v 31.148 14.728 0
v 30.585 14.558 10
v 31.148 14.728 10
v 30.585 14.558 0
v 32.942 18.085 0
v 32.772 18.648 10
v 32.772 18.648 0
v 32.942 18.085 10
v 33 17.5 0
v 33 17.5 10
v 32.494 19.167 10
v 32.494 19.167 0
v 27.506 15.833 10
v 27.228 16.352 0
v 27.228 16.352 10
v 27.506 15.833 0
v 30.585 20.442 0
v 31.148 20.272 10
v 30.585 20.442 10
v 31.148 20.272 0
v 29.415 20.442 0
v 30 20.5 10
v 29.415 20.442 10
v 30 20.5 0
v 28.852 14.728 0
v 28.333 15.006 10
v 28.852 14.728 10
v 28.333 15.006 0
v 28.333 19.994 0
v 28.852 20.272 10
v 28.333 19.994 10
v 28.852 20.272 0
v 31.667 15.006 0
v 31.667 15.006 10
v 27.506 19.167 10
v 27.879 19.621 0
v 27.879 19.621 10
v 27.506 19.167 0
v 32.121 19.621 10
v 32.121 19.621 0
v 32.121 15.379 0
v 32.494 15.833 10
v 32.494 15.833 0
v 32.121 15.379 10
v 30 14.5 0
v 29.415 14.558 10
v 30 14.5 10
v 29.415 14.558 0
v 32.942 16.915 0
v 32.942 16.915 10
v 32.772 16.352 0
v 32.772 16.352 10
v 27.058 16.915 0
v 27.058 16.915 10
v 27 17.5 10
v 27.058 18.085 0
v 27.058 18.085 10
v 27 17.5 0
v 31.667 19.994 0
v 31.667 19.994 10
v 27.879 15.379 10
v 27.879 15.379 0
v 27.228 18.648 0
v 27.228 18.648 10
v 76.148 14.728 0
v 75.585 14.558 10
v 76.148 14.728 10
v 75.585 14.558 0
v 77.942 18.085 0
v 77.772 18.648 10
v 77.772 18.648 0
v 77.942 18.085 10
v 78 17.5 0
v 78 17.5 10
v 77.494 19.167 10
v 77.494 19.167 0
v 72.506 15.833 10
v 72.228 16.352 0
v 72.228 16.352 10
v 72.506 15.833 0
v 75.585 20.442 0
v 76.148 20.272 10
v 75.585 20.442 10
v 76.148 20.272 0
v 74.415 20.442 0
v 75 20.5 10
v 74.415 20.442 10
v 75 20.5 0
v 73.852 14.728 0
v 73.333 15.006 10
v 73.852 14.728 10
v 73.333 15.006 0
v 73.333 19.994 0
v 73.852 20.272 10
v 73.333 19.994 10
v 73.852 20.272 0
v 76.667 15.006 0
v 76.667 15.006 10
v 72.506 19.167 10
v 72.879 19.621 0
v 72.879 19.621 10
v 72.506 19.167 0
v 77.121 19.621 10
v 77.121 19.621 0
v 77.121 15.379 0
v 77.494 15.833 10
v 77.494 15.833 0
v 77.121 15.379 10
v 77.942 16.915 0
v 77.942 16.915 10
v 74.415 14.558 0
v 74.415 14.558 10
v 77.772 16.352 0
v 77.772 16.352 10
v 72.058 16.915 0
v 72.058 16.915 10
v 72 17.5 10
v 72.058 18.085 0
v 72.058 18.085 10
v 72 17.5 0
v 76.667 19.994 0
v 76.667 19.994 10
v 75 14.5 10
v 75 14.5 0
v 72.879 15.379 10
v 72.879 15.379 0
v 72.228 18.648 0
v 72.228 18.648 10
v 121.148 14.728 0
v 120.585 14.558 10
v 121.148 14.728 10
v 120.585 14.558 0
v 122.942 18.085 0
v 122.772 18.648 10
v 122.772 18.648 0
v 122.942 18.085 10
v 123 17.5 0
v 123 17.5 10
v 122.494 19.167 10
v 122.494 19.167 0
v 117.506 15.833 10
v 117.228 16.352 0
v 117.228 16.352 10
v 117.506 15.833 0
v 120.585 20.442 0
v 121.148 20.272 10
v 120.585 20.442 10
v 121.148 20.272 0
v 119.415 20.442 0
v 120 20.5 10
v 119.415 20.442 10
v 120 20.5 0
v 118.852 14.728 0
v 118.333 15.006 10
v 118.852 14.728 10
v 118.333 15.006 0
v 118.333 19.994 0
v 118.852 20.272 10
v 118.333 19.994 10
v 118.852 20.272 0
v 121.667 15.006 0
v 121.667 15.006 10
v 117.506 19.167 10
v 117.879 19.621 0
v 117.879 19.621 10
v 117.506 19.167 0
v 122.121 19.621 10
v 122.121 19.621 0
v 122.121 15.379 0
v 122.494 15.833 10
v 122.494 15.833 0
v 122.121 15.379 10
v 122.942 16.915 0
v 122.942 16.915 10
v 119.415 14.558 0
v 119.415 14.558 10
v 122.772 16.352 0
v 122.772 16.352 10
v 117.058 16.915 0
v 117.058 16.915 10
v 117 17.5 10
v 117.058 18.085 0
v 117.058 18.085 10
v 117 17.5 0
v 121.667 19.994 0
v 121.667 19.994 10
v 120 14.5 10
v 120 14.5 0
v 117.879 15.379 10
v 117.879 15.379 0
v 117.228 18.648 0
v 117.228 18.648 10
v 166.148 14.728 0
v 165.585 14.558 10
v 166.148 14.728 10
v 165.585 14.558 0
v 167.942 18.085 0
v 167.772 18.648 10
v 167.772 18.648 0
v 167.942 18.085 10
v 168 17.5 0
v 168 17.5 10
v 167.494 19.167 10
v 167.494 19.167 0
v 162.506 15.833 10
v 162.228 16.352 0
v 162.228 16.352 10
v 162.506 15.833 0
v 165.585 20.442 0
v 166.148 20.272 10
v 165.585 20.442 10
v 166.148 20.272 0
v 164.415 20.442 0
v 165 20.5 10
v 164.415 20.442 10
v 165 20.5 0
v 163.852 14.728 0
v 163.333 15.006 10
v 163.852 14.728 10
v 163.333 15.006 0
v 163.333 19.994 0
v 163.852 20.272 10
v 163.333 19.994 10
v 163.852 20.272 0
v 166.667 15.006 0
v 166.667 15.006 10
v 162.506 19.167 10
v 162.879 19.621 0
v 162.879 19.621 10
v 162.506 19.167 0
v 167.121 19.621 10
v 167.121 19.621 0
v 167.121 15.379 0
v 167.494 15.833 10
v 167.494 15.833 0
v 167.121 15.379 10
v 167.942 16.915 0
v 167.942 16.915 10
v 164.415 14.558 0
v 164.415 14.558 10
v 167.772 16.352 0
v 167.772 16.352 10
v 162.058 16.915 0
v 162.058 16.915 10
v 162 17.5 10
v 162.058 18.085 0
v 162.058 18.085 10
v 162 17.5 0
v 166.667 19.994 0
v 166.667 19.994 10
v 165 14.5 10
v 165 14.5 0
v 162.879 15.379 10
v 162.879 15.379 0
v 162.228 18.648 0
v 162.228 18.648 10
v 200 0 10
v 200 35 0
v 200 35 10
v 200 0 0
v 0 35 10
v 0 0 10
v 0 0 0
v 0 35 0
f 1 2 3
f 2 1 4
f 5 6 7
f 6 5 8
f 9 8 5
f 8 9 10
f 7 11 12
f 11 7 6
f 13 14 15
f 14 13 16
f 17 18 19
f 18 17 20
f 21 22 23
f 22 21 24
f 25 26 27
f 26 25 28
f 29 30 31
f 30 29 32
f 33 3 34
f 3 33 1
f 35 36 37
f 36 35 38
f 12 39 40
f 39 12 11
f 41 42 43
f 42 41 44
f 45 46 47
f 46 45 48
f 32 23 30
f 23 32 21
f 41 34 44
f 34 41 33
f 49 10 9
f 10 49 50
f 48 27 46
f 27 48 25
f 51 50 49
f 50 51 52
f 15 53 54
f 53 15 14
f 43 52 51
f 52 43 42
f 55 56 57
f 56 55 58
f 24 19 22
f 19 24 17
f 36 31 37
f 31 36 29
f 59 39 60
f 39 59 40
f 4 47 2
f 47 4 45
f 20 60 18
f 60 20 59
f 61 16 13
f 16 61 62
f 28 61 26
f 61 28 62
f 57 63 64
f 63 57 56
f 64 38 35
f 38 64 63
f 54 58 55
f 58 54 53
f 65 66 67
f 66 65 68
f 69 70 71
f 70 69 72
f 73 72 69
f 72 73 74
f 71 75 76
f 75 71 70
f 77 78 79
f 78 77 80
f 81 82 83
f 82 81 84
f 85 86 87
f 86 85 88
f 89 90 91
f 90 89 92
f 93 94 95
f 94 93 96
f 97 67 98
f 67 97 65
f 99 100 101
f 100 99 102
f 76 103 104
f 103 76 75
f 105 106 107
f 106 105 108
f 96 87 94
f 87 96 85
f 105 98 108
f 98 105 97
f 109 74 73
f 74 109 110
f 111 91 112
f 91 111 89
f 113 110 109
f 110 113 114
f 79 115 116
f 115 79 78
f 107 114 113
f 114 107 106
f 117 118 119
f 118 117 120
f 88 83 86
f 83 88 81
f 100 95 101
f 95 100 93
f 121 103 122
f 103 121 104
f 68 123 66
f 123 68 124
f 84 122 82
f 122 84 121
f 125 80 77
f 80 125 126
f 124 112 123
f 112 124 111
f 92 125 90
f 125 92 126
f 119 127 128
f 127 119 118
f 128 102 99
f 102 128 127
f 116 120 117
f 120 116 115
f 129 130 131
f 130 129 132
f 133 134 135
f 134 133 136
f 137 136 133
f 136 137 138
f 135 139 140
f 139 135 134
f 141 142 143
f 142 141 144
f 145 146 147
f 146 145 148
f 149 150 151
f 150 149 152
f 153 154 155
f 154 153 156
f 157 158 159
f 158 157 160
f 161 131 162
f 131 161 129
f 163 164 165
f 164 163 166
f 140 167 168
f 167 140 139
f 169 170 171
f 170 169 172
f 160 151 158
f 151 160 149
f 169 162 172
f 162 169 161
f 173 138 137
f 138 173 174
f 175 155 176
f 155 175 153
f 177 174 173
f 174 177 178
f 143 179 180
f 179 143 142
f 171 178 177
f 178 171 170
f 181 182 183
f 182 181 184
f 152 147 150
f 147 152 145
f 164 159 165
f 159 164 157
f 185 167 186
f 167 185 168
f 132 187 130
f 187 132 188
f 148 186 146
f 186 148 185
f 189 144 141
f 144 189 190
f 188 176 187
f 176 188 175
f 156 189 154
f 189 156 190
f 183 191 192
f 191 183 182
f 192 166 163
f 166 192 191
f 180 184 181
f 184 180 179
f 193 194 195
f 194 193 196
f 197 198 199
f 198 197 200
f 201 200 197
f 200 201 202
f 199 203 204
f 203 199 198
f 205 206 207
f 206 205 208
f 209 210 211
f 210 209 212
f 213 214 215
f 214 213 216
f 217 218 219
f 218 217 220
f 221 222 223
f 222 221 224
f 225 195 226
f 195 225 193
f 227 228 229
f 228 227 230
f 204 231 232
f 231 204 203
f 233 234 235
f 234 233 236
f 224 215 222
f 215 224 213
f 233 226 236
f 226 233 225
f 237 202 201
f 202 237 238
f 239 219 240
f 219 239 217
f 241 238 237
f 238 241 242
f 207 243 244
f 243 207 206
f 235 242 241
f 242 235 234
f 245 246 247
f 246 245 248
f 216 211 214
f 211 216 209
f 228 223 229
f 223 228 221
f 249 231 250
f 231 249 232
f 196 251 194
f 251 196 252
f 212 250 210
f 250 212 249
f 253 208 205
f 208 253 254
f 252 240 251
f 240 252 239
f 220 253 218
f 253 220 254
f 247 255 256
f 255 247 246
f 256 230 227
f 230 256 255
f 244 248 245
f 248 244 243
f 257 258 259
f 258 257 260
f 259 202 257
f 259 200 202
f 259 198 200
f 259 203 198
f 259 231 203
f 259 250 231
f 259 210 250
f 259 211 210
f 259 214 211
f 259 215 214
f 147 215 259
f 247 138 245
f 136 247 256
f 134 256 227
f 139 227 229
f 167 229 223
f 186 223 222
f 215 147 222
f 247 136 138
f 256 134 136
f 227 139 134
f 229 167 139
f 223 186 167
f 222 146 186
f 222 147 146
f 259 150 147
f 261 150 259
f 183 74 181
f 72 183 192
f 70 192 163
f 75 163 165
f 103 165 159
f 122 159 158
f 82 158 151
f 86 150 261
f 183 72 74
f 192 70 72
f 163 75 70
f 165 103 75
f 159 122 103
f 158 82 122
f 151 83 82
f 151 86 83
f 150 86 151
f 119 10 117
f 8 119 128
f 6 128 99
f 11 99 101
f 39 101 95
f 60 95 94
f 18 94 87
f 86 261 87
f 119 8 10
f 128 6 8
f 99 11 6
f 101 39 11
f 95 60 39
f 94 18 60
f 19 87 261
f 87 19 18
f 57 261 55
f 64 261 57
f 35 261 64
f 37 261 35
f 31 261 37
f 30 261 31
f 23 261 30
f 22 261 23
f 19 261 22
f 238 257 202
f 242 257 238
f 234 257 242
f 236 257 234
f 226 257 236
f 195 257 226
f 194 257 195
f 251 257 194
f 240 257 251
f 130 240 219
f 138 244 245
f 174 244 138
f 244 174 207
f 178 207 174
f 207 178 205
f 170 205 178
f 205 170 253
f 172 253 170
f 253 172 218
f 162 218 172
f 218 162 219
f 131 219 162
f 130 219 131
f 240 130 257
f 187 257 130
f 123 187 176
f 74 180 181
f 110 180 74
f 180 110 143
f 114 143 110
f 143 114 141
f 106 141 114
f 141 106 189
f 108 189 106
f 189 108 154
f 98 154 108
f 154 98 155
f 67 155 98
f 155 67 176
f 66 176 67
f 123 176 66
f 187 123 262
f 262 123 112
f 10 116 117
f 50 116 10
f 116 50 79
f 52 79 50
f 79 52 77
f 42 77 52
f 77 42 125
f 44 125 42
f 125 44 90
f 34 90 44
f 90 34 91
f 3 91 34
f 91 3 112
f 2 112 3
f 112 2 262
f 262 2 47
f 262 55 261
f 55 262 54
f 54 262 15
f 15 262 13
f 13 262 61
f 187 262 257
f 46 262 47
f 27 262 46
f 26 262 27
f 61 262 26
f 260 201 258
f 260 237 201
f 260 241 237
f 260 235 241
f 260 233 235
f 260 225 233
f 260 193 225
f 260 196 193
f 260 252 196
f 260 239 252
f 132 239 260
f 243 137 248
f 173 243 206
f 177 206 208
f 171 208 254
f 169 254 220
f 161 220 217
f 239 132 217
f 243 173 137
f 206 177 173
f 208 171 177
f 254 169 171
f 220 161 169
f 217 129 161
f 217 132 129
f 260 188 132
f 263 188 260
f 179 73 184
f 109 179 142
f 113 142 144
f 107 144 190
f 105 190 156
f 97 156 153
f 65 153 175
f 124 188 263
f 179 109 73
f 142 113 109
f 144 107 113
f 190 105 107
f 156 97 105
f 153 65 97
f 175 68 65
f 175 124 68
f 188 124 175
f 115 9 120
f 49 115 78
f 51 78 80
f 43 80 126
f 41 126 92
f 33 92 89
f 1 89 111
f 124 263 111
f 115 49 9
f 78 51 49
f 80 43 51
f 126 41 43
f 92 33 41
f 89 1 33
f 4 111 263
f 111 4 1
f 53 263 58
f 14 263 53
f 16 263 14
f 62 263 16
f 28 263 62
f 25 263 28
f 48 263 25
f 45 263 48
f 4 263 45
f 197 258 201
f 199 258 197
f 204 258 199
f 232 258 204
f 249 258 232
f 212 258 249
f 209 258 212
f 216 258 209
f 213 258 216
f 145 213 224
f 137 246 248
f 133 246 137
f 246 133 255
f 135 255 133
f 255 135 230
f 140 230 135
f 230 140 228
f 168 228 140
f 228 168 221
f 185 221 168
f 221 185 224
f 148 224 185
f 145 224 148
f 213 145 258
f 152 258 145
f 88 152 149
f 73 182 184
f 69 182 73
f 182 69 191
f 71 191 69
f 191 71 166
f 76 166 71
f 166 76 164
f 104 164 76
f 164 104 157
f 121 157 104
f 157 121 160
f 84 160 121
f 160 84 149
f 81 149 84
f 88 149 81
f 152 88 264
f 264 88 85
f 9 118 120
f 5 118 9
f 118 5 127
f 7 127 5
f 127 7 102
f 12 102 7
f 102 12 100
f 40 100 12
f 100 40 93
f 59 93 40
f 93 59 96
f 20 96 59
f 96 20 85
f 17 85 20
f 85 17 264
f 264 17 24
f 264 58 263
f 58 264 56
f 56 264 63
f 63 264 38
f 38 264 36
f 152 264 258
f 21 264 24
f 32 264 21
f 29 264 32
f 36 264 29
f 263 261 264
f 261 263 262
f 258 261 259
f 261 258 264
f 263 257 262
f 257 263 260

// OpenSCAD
$fn = 32;

// ----------------------------------------------------------------------
// Long rail: 200-250 mm mounting rail
// ----------------------------------------------------------------------

// --- parameters (mm) ---
rail_l = 200;             // rail length, X
rail_w = 35;              // rail width, Y
rail_t = 10;              // rail thickness, Z
hole_d = 6;               // mounting hole diameter
hole_start = 30;          // first hole offset from the end
hole_pitch = 45;          // hole pitch
holes = 4;                // number of holes

difference() {
  cube([rail_l, rail_w, rail_t]);
  for (i = [0 : holes - 1])
    translate([hole_start + i * hole_pitch, rail_w / 2, -1])
      cylinder(h = rail_t + 2, d = hole_d);
}
